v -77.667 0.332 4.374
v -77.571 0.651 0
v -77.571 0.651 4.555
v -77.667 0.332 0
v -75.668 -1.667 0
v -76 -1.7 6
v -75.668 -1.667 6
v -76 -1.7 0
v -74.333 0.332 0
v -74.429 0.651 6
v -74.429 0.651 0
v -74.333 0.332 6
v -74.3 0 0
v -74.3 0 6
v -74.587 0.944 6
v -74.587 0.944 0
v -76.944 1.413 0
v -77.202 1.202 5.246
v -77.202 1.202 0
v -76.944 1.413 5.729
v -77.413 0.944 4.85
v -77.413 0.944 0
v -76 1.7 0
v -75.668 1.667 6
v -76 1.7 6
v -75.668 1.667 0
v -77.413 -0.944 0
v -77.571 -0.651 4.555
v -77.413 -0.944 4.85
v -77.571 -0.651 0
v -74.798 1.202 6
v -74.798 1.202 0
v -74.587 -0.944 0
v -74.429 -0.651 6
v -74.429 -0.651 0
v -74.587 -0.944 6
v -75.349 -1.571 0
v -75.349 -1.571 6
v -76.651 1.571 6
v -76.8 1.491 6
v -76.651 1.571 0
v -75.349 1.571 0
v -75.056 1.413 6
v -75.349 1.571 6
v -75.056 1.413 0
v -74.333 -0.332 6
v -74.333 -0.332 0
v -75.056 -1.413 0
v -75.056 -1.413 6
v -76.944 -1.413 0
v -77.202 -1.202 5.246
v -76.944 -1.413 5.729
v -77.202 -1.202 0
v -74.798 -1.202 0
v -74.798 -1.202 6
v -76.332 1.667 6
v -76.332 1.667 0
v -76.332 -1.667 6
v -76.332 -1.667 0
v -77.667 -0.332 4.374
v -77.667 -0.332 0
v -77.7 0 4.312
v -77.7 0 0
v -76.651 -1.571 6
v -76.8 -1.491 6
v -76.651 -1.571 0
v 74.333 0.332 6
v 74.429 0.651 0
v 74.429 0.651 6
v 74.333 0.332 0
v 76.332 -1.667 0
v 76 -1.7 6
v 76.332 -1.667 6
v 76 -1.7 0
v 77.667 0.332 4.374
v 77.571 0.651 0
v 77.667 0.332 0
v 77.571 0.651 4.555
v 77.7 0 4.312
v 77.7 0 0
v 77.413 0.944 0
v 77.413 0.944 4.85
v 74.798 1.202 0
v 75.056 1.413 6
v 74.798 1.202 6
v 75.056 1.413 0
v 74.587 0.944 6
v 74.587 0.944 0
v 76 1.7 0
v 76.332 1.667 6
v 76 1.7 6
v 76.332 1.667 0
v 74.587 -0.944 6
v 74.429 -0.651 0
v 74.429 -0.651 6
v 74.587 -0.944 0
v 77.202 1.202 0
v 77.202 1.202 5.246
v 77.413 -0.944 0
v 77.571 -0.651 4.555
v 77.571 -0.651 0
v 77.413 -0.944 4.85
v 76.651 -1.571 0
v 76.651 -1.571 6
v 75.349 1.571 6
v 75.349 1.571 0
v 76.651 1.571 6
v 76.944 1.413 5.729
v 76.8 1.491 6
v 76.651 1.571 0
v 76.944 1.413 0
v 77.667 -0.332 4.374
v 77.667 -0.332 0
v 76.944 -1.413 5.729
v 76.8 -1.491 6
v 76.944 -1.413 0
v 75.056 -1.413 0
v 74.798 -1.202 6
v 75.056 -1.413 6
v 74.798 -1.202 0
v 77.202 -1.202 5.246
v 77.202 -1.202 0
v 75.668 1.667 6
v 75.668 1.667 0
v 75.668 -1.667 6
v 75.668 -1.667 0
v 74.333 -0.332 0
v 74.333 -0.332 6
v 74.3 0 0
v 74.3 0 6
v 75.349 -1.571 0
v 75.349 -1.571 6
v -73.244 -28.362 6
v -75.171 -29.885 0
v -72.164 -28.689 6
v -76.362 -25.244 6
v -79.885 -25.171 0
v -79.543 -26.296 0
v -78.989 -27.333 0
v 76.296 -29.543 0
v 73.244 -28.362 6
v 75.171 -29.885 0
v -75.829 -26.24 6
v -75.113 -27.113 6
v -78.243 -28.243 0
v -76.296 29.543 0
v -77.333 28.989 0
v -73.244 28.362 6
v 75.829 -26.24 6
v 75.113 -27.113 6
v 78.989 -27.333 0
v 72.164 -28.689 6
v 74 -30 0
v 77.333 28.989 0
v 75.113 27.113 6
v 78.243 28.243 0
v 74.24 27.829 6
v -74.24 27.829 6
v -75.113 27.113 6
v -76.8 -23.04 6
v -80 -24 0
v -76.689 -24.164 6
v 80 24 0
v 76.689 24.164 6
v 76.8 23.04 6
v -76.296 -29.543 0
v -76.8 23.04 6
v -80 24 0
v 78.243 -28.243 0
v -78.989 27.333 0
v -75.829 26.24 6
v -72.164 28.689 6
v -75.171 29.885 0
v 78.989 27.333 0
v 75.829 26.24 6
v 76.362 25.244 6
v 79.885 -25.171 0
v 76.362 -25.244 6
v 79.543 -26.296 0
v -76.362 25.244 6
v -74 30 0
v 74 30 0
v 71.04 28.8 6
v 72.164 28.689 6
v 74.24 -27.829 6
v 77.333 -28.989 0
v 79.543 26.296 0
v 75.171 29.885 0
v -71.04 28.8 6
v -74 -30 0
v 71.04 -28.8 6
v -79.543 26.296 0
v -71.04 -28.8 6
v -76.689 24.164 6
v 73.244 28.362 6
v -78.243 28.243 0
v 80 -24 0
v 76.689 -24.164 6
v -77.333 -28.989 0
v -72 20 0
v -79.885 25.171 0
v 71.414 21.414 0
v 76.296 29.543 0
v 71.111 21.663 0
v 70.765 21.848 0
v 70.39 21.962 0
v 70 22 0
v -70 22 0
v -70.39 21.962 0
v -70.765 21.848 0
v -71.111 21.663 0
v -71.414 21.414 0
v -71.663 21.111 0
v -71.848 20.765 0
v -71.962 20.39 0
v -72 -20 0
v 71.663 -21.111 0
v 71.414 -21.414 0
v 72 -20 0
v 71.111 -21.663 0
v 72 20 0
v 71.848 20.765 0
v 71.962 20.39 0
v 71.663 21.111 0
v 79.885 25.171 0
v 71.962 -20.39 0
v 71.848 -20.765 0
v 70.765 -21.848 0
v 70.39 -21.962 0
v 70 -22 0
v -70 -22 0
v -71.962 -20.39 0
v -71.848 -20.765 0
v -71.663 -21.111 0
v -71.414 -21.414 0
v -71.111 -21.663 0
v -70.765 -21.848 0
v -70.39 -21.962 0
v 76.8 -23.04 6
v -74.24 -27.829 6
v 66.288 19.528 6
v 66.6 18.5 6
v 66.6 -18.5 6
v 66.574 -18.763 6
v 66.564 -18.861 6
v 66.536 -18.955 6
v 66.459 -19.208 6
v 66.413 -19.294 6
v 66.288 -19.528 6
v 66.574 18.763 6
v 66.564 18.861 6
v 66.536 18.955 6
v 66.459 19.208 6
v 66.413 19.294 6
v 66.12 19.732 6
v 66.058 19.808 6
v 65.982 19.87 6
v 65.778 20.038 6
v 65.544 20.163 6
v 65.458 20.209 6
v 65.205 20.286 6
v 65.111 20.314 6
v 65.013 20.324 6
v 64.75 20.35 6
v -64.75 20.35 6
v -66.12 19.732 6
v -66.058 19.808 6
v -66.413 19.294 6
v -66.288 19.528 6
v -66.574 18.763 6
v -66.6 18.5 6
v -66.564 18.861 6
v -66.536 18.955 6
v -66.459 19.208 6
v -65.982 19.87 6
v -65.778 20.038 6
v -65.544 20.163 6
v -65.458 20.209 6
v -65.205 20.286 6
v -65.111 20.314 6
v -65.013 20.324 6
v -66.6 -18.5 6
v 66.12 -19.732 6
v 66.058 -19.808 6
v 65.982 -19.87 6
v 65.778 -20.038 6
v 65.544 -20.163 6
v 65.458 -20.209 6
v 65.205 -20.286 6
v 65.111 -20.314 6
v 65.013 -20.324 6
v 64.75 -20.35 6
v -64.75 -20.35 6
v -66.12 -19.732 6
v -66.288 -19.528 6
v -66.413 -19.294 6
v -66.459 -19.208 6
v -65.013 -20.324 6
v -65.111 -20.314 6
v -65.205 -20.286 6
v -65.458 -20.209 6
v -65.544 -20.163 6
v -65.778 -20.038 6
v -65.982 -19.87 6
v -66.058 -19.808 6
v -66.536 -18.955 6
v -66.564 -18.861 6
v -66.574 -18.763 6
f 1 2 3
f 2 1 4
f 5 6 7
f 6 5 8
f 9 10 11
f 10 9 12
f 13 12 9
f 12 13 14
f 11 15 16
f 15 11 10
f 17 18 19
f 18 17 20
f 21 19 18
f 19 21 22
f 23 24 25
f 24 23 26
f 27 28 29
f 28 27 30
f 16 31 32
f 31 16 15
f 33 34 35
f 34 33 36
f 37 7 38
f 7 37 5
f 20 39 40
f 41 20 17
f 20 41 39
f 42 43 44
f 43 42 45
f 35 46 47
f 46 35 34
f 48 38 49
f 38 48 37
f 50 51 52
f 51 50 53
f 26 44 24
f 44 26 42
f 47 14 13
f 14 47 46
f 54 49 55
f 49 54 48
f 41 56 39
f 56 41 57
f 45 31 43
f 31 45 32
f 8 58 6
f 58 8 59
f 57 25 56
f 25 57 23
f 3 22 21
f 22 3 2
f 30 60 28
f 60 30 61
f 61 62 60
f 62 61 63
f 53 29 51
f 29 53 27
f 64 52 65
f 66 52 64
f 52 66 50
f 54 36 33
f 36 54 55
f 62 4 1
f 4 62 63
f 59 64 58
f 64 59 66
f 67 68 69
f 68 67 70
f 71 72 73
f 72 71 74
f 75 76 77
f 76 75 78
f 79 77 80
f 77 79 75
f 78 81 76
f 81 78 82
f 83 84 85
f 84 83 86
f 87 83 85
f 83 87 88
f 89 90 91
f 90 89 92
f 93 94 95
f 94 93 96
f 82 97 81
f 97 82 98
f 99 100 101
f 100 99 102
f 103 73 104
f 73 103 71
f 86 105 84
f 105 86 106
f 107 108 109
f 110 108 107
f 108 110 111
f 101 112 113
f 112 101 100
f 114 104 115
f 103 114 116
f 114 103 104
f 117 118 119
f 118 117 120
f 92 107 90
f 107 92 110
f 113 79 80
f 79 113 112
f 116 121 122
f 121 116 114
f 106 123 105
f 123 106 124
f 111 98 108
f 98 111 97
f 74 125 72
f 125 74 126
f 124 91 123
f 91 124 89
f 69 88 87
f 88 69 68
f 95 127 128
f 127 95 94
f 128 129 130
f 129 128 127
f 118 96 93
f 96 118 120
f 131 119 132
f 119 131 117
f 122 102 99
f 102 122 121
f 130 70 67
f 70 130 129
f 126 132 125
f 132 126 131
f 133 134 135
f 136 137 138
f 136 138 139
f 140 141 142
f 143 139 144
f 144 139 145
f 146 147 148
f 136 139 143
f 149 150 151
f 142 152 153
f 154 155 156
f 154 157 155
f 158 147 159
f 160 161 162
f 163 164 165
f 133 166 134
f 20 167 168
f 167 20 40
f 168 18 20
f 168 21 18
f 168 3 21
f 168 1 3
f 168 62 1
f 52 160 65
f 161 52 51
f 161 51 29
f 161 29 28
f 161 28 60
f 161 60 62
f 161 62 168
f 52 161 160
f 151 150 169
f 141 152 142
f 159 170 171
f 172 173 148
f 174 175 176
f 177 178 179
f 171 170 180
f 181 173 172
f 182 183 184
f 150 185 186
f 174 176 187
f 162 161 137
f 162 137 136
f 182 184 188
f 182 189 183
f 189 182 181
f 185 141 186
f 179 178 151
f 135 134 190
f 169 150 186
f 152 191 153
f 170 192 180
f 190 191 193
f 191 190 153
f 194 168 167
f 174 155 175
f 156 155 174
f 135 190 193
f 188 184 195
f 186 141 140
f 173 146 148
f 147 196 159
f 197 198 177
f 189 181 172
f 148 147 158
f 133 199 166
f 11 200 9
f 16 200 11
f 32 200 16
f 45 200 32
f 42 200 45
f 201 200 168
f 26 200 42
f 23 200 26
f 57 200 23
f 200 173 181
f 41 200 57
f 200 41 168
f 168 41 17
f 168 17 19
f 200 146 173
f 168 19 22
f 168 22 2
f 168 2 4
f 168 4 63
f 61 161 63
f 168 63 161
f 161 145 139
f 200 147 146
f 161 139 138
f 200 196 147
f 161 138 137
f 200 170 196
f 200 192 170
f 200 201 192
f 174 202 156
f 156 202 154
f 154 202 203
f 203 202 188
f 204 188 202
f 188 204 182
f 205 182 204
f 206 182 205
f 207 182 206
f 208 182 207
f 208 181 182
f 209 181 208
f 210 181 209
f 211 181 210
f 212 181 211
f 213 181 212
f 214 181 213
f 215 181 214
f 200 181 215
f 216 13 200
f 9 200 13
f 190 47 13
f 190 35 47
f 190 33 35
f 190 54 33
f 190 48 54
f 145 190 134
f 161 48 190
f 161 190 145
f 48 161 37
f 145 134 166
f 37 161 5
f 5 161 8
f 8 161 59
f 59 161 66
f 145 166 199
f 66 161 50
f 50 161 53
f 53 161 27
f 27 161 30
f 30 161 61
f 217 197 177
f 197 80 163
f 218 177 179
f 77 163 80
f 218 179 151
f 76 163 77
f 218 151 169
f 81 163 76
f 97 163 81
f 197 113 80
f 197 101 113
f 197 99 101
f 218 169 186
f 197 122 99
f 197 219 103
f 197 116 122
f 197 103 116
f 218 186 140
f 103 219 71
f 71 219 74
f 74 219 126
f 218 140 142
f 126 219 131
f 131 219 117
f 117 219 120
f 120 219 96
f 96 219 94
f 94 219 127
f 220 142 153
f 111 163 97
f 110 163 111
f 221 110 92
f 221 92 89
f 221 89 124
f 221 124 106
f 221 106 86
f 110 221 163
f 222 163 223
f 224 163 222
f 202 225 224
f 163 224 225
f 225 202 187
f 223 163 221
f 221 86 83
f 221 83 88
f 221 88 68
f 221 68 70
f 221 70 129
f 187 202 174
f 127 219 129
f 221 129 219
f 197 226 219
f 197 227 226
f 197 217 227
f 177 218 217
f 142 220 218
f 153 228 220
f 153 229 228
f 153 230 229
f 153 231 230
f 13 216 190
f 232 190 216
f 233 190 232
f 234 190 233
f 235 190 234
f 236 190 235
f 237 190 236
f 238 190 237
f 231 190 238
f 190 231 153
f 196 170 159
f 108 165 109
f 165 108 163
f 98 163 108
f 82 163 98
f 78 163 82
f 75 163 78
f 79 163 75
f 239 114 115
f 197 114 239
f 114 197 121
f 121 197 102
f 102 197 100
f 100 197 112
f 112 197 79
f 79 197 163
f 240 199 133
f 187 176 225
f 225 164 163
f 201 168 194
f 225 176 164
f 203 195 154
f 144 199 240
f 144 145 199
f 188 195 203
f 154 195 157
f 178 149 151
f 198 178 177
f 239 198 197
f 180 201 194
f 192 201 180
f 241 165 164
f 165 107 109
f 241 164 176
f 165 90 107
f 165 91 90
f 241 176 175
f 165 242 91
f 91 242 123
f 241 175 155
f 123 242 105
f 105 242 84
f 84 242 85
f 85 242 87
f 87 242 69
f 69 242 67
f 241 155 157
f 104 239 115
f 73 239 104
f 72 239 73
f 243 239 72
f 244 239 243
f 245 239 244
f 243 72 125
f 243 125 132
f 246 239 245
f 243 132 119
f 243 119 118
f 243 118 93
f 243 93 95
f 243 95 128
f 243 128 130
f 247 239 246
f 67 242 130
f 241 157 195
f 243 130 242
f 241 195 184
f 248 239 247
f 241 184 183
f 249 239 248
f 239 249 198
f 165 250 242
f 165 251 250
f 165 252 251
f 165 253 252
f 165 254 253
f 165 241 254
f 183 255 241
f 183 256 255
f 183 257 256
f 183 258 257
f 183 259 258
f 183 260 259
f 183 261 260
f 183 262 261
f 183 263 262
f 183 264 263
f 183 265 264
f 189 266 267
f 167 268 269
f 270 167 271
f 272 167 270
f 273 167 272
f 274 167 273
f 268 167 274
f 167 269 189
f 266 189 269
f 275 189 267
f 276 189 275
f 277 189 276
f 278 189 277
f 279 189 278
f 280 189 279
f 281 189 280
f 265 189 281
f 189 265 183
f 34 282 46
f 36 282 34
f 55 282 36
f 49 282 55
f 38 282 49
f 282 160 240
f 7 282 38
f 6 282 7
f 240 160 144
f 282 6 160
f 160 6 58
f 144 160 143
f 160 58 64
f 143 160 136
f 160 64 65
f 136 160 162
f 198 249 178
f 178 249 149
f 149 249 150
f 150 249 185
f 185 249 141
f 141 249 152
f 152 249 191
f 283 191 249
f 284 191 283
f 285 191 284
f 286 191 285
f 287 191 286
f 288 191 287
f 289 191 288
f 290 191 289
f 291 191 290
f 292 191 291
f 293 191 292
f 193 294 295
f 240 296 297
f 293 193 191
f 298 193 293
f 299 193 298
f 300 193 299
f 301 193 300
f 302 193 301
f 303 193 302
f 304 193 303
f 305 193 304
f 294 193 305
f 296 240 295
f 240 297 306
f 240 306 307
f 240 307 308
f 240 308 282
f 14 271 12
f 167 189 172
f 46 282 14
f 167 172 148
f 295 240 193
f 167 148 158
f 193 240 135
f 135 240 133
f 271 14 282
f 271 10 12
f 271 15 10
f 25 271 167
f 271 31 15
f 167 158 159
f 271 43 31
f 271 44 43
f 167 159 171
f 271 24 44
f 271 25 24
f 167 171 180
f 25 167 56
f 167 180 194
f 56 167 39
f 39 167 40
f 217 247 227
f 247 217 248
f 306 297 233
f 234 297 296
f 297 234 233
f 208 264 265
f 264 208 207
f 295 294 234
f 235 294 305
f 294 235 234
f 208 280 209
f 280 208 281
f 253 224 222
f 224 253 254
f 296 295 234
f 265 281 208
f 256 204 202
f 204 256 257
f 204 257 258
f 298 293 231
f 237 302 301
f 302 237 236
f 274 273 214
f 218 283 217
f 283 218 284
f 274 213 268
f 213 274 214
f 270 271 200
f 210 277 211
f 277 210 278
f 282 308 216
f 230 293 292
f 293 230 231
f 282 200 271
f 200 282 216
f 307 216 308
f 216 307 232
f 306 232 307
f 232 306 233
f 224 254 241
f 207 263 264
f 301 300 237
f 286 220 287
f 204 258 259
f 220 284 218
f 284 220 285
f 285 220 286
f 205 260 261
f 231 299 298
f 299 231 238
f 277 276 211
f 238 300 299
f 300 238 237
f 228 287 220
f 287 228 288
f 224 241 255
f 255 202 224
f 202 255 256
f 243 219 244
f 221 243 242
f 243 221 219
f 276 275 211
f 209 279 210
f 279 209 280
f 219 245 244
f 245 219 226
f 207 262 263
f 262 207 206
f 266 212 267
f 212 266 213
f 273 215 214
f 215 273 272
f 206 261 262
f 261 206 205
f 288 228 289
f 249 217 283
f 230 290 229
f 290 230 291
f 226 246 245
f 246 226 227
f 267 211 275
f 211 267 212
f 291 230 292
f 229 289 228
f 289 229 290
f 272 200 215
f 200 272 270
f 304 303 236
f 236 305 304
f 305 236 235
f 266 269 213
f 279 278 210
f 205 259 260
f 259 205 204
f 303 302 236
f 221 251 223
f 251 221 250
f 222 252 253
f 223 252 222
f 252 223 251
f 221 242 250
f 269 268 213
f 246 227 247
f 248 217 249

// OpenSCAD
$fn = 32;

// ----------------------------------------------------------------------
// Display bezel: 160 x 60 mm frame, opening 144x44 mm
// ----------------------------------------------------------------------

// --- parameters (mm) ---
length = 160;             // frame outside length, X
width = 60;               // frame outside width, Y
frame_w = 8;              // frame width
thickness = 6;            // frame thickness
corner_r = 6;             // outside corner radius
chamfer = 0.96;           // outer wall taper
funnel = 0.9;             // inner opening taper
opening_l = 144;          // opening length
opening_w = 44;           // opening width
inner_r = 2;              // opening corner radius
hole_d = 3.4;             // mounting screw clearance
holes_per_side = 1;       // holes per short side
hole_inset = 4;           // hole centre inset from the outside edge

/* rounded-rectangle outlines, generated with loops */
module rounded_ring(l_nom, w_nom, r) {
  hull() {
    for (sx = [-1, 1]) for (sy = [-1, 1])
      translate([sx * (l_nom / 2 - r), sy * (w_nom / 2 - r)]) circle(r = r);
  }
}

difference() {
  /* frame body, drafted so the outer edge is a variable-depth chamfer */
  linear_extrude(height = thickness, scale = chamfer)
    rounded_ring(length, width, corner_r);
  /* viewing opening, drafted the other way for a funnel edge */
  linear_extrude(height = thickness + 2, scale = funnel)
    translate([0, 0, -1]) rounded_ring(opening_l, opening_w, inner_r);
  /* mounting screws through the frame lands */
  for (sx = [-1, 1]) for (i = [1 : holes_per_side])
    translate([sx * (length / 2 - hole_inset),
               (i - (holes_per_side + 1) / 2) * width * 0.5, -1])
      cylinder(h = thickness + 2, d = hole_d);
}
